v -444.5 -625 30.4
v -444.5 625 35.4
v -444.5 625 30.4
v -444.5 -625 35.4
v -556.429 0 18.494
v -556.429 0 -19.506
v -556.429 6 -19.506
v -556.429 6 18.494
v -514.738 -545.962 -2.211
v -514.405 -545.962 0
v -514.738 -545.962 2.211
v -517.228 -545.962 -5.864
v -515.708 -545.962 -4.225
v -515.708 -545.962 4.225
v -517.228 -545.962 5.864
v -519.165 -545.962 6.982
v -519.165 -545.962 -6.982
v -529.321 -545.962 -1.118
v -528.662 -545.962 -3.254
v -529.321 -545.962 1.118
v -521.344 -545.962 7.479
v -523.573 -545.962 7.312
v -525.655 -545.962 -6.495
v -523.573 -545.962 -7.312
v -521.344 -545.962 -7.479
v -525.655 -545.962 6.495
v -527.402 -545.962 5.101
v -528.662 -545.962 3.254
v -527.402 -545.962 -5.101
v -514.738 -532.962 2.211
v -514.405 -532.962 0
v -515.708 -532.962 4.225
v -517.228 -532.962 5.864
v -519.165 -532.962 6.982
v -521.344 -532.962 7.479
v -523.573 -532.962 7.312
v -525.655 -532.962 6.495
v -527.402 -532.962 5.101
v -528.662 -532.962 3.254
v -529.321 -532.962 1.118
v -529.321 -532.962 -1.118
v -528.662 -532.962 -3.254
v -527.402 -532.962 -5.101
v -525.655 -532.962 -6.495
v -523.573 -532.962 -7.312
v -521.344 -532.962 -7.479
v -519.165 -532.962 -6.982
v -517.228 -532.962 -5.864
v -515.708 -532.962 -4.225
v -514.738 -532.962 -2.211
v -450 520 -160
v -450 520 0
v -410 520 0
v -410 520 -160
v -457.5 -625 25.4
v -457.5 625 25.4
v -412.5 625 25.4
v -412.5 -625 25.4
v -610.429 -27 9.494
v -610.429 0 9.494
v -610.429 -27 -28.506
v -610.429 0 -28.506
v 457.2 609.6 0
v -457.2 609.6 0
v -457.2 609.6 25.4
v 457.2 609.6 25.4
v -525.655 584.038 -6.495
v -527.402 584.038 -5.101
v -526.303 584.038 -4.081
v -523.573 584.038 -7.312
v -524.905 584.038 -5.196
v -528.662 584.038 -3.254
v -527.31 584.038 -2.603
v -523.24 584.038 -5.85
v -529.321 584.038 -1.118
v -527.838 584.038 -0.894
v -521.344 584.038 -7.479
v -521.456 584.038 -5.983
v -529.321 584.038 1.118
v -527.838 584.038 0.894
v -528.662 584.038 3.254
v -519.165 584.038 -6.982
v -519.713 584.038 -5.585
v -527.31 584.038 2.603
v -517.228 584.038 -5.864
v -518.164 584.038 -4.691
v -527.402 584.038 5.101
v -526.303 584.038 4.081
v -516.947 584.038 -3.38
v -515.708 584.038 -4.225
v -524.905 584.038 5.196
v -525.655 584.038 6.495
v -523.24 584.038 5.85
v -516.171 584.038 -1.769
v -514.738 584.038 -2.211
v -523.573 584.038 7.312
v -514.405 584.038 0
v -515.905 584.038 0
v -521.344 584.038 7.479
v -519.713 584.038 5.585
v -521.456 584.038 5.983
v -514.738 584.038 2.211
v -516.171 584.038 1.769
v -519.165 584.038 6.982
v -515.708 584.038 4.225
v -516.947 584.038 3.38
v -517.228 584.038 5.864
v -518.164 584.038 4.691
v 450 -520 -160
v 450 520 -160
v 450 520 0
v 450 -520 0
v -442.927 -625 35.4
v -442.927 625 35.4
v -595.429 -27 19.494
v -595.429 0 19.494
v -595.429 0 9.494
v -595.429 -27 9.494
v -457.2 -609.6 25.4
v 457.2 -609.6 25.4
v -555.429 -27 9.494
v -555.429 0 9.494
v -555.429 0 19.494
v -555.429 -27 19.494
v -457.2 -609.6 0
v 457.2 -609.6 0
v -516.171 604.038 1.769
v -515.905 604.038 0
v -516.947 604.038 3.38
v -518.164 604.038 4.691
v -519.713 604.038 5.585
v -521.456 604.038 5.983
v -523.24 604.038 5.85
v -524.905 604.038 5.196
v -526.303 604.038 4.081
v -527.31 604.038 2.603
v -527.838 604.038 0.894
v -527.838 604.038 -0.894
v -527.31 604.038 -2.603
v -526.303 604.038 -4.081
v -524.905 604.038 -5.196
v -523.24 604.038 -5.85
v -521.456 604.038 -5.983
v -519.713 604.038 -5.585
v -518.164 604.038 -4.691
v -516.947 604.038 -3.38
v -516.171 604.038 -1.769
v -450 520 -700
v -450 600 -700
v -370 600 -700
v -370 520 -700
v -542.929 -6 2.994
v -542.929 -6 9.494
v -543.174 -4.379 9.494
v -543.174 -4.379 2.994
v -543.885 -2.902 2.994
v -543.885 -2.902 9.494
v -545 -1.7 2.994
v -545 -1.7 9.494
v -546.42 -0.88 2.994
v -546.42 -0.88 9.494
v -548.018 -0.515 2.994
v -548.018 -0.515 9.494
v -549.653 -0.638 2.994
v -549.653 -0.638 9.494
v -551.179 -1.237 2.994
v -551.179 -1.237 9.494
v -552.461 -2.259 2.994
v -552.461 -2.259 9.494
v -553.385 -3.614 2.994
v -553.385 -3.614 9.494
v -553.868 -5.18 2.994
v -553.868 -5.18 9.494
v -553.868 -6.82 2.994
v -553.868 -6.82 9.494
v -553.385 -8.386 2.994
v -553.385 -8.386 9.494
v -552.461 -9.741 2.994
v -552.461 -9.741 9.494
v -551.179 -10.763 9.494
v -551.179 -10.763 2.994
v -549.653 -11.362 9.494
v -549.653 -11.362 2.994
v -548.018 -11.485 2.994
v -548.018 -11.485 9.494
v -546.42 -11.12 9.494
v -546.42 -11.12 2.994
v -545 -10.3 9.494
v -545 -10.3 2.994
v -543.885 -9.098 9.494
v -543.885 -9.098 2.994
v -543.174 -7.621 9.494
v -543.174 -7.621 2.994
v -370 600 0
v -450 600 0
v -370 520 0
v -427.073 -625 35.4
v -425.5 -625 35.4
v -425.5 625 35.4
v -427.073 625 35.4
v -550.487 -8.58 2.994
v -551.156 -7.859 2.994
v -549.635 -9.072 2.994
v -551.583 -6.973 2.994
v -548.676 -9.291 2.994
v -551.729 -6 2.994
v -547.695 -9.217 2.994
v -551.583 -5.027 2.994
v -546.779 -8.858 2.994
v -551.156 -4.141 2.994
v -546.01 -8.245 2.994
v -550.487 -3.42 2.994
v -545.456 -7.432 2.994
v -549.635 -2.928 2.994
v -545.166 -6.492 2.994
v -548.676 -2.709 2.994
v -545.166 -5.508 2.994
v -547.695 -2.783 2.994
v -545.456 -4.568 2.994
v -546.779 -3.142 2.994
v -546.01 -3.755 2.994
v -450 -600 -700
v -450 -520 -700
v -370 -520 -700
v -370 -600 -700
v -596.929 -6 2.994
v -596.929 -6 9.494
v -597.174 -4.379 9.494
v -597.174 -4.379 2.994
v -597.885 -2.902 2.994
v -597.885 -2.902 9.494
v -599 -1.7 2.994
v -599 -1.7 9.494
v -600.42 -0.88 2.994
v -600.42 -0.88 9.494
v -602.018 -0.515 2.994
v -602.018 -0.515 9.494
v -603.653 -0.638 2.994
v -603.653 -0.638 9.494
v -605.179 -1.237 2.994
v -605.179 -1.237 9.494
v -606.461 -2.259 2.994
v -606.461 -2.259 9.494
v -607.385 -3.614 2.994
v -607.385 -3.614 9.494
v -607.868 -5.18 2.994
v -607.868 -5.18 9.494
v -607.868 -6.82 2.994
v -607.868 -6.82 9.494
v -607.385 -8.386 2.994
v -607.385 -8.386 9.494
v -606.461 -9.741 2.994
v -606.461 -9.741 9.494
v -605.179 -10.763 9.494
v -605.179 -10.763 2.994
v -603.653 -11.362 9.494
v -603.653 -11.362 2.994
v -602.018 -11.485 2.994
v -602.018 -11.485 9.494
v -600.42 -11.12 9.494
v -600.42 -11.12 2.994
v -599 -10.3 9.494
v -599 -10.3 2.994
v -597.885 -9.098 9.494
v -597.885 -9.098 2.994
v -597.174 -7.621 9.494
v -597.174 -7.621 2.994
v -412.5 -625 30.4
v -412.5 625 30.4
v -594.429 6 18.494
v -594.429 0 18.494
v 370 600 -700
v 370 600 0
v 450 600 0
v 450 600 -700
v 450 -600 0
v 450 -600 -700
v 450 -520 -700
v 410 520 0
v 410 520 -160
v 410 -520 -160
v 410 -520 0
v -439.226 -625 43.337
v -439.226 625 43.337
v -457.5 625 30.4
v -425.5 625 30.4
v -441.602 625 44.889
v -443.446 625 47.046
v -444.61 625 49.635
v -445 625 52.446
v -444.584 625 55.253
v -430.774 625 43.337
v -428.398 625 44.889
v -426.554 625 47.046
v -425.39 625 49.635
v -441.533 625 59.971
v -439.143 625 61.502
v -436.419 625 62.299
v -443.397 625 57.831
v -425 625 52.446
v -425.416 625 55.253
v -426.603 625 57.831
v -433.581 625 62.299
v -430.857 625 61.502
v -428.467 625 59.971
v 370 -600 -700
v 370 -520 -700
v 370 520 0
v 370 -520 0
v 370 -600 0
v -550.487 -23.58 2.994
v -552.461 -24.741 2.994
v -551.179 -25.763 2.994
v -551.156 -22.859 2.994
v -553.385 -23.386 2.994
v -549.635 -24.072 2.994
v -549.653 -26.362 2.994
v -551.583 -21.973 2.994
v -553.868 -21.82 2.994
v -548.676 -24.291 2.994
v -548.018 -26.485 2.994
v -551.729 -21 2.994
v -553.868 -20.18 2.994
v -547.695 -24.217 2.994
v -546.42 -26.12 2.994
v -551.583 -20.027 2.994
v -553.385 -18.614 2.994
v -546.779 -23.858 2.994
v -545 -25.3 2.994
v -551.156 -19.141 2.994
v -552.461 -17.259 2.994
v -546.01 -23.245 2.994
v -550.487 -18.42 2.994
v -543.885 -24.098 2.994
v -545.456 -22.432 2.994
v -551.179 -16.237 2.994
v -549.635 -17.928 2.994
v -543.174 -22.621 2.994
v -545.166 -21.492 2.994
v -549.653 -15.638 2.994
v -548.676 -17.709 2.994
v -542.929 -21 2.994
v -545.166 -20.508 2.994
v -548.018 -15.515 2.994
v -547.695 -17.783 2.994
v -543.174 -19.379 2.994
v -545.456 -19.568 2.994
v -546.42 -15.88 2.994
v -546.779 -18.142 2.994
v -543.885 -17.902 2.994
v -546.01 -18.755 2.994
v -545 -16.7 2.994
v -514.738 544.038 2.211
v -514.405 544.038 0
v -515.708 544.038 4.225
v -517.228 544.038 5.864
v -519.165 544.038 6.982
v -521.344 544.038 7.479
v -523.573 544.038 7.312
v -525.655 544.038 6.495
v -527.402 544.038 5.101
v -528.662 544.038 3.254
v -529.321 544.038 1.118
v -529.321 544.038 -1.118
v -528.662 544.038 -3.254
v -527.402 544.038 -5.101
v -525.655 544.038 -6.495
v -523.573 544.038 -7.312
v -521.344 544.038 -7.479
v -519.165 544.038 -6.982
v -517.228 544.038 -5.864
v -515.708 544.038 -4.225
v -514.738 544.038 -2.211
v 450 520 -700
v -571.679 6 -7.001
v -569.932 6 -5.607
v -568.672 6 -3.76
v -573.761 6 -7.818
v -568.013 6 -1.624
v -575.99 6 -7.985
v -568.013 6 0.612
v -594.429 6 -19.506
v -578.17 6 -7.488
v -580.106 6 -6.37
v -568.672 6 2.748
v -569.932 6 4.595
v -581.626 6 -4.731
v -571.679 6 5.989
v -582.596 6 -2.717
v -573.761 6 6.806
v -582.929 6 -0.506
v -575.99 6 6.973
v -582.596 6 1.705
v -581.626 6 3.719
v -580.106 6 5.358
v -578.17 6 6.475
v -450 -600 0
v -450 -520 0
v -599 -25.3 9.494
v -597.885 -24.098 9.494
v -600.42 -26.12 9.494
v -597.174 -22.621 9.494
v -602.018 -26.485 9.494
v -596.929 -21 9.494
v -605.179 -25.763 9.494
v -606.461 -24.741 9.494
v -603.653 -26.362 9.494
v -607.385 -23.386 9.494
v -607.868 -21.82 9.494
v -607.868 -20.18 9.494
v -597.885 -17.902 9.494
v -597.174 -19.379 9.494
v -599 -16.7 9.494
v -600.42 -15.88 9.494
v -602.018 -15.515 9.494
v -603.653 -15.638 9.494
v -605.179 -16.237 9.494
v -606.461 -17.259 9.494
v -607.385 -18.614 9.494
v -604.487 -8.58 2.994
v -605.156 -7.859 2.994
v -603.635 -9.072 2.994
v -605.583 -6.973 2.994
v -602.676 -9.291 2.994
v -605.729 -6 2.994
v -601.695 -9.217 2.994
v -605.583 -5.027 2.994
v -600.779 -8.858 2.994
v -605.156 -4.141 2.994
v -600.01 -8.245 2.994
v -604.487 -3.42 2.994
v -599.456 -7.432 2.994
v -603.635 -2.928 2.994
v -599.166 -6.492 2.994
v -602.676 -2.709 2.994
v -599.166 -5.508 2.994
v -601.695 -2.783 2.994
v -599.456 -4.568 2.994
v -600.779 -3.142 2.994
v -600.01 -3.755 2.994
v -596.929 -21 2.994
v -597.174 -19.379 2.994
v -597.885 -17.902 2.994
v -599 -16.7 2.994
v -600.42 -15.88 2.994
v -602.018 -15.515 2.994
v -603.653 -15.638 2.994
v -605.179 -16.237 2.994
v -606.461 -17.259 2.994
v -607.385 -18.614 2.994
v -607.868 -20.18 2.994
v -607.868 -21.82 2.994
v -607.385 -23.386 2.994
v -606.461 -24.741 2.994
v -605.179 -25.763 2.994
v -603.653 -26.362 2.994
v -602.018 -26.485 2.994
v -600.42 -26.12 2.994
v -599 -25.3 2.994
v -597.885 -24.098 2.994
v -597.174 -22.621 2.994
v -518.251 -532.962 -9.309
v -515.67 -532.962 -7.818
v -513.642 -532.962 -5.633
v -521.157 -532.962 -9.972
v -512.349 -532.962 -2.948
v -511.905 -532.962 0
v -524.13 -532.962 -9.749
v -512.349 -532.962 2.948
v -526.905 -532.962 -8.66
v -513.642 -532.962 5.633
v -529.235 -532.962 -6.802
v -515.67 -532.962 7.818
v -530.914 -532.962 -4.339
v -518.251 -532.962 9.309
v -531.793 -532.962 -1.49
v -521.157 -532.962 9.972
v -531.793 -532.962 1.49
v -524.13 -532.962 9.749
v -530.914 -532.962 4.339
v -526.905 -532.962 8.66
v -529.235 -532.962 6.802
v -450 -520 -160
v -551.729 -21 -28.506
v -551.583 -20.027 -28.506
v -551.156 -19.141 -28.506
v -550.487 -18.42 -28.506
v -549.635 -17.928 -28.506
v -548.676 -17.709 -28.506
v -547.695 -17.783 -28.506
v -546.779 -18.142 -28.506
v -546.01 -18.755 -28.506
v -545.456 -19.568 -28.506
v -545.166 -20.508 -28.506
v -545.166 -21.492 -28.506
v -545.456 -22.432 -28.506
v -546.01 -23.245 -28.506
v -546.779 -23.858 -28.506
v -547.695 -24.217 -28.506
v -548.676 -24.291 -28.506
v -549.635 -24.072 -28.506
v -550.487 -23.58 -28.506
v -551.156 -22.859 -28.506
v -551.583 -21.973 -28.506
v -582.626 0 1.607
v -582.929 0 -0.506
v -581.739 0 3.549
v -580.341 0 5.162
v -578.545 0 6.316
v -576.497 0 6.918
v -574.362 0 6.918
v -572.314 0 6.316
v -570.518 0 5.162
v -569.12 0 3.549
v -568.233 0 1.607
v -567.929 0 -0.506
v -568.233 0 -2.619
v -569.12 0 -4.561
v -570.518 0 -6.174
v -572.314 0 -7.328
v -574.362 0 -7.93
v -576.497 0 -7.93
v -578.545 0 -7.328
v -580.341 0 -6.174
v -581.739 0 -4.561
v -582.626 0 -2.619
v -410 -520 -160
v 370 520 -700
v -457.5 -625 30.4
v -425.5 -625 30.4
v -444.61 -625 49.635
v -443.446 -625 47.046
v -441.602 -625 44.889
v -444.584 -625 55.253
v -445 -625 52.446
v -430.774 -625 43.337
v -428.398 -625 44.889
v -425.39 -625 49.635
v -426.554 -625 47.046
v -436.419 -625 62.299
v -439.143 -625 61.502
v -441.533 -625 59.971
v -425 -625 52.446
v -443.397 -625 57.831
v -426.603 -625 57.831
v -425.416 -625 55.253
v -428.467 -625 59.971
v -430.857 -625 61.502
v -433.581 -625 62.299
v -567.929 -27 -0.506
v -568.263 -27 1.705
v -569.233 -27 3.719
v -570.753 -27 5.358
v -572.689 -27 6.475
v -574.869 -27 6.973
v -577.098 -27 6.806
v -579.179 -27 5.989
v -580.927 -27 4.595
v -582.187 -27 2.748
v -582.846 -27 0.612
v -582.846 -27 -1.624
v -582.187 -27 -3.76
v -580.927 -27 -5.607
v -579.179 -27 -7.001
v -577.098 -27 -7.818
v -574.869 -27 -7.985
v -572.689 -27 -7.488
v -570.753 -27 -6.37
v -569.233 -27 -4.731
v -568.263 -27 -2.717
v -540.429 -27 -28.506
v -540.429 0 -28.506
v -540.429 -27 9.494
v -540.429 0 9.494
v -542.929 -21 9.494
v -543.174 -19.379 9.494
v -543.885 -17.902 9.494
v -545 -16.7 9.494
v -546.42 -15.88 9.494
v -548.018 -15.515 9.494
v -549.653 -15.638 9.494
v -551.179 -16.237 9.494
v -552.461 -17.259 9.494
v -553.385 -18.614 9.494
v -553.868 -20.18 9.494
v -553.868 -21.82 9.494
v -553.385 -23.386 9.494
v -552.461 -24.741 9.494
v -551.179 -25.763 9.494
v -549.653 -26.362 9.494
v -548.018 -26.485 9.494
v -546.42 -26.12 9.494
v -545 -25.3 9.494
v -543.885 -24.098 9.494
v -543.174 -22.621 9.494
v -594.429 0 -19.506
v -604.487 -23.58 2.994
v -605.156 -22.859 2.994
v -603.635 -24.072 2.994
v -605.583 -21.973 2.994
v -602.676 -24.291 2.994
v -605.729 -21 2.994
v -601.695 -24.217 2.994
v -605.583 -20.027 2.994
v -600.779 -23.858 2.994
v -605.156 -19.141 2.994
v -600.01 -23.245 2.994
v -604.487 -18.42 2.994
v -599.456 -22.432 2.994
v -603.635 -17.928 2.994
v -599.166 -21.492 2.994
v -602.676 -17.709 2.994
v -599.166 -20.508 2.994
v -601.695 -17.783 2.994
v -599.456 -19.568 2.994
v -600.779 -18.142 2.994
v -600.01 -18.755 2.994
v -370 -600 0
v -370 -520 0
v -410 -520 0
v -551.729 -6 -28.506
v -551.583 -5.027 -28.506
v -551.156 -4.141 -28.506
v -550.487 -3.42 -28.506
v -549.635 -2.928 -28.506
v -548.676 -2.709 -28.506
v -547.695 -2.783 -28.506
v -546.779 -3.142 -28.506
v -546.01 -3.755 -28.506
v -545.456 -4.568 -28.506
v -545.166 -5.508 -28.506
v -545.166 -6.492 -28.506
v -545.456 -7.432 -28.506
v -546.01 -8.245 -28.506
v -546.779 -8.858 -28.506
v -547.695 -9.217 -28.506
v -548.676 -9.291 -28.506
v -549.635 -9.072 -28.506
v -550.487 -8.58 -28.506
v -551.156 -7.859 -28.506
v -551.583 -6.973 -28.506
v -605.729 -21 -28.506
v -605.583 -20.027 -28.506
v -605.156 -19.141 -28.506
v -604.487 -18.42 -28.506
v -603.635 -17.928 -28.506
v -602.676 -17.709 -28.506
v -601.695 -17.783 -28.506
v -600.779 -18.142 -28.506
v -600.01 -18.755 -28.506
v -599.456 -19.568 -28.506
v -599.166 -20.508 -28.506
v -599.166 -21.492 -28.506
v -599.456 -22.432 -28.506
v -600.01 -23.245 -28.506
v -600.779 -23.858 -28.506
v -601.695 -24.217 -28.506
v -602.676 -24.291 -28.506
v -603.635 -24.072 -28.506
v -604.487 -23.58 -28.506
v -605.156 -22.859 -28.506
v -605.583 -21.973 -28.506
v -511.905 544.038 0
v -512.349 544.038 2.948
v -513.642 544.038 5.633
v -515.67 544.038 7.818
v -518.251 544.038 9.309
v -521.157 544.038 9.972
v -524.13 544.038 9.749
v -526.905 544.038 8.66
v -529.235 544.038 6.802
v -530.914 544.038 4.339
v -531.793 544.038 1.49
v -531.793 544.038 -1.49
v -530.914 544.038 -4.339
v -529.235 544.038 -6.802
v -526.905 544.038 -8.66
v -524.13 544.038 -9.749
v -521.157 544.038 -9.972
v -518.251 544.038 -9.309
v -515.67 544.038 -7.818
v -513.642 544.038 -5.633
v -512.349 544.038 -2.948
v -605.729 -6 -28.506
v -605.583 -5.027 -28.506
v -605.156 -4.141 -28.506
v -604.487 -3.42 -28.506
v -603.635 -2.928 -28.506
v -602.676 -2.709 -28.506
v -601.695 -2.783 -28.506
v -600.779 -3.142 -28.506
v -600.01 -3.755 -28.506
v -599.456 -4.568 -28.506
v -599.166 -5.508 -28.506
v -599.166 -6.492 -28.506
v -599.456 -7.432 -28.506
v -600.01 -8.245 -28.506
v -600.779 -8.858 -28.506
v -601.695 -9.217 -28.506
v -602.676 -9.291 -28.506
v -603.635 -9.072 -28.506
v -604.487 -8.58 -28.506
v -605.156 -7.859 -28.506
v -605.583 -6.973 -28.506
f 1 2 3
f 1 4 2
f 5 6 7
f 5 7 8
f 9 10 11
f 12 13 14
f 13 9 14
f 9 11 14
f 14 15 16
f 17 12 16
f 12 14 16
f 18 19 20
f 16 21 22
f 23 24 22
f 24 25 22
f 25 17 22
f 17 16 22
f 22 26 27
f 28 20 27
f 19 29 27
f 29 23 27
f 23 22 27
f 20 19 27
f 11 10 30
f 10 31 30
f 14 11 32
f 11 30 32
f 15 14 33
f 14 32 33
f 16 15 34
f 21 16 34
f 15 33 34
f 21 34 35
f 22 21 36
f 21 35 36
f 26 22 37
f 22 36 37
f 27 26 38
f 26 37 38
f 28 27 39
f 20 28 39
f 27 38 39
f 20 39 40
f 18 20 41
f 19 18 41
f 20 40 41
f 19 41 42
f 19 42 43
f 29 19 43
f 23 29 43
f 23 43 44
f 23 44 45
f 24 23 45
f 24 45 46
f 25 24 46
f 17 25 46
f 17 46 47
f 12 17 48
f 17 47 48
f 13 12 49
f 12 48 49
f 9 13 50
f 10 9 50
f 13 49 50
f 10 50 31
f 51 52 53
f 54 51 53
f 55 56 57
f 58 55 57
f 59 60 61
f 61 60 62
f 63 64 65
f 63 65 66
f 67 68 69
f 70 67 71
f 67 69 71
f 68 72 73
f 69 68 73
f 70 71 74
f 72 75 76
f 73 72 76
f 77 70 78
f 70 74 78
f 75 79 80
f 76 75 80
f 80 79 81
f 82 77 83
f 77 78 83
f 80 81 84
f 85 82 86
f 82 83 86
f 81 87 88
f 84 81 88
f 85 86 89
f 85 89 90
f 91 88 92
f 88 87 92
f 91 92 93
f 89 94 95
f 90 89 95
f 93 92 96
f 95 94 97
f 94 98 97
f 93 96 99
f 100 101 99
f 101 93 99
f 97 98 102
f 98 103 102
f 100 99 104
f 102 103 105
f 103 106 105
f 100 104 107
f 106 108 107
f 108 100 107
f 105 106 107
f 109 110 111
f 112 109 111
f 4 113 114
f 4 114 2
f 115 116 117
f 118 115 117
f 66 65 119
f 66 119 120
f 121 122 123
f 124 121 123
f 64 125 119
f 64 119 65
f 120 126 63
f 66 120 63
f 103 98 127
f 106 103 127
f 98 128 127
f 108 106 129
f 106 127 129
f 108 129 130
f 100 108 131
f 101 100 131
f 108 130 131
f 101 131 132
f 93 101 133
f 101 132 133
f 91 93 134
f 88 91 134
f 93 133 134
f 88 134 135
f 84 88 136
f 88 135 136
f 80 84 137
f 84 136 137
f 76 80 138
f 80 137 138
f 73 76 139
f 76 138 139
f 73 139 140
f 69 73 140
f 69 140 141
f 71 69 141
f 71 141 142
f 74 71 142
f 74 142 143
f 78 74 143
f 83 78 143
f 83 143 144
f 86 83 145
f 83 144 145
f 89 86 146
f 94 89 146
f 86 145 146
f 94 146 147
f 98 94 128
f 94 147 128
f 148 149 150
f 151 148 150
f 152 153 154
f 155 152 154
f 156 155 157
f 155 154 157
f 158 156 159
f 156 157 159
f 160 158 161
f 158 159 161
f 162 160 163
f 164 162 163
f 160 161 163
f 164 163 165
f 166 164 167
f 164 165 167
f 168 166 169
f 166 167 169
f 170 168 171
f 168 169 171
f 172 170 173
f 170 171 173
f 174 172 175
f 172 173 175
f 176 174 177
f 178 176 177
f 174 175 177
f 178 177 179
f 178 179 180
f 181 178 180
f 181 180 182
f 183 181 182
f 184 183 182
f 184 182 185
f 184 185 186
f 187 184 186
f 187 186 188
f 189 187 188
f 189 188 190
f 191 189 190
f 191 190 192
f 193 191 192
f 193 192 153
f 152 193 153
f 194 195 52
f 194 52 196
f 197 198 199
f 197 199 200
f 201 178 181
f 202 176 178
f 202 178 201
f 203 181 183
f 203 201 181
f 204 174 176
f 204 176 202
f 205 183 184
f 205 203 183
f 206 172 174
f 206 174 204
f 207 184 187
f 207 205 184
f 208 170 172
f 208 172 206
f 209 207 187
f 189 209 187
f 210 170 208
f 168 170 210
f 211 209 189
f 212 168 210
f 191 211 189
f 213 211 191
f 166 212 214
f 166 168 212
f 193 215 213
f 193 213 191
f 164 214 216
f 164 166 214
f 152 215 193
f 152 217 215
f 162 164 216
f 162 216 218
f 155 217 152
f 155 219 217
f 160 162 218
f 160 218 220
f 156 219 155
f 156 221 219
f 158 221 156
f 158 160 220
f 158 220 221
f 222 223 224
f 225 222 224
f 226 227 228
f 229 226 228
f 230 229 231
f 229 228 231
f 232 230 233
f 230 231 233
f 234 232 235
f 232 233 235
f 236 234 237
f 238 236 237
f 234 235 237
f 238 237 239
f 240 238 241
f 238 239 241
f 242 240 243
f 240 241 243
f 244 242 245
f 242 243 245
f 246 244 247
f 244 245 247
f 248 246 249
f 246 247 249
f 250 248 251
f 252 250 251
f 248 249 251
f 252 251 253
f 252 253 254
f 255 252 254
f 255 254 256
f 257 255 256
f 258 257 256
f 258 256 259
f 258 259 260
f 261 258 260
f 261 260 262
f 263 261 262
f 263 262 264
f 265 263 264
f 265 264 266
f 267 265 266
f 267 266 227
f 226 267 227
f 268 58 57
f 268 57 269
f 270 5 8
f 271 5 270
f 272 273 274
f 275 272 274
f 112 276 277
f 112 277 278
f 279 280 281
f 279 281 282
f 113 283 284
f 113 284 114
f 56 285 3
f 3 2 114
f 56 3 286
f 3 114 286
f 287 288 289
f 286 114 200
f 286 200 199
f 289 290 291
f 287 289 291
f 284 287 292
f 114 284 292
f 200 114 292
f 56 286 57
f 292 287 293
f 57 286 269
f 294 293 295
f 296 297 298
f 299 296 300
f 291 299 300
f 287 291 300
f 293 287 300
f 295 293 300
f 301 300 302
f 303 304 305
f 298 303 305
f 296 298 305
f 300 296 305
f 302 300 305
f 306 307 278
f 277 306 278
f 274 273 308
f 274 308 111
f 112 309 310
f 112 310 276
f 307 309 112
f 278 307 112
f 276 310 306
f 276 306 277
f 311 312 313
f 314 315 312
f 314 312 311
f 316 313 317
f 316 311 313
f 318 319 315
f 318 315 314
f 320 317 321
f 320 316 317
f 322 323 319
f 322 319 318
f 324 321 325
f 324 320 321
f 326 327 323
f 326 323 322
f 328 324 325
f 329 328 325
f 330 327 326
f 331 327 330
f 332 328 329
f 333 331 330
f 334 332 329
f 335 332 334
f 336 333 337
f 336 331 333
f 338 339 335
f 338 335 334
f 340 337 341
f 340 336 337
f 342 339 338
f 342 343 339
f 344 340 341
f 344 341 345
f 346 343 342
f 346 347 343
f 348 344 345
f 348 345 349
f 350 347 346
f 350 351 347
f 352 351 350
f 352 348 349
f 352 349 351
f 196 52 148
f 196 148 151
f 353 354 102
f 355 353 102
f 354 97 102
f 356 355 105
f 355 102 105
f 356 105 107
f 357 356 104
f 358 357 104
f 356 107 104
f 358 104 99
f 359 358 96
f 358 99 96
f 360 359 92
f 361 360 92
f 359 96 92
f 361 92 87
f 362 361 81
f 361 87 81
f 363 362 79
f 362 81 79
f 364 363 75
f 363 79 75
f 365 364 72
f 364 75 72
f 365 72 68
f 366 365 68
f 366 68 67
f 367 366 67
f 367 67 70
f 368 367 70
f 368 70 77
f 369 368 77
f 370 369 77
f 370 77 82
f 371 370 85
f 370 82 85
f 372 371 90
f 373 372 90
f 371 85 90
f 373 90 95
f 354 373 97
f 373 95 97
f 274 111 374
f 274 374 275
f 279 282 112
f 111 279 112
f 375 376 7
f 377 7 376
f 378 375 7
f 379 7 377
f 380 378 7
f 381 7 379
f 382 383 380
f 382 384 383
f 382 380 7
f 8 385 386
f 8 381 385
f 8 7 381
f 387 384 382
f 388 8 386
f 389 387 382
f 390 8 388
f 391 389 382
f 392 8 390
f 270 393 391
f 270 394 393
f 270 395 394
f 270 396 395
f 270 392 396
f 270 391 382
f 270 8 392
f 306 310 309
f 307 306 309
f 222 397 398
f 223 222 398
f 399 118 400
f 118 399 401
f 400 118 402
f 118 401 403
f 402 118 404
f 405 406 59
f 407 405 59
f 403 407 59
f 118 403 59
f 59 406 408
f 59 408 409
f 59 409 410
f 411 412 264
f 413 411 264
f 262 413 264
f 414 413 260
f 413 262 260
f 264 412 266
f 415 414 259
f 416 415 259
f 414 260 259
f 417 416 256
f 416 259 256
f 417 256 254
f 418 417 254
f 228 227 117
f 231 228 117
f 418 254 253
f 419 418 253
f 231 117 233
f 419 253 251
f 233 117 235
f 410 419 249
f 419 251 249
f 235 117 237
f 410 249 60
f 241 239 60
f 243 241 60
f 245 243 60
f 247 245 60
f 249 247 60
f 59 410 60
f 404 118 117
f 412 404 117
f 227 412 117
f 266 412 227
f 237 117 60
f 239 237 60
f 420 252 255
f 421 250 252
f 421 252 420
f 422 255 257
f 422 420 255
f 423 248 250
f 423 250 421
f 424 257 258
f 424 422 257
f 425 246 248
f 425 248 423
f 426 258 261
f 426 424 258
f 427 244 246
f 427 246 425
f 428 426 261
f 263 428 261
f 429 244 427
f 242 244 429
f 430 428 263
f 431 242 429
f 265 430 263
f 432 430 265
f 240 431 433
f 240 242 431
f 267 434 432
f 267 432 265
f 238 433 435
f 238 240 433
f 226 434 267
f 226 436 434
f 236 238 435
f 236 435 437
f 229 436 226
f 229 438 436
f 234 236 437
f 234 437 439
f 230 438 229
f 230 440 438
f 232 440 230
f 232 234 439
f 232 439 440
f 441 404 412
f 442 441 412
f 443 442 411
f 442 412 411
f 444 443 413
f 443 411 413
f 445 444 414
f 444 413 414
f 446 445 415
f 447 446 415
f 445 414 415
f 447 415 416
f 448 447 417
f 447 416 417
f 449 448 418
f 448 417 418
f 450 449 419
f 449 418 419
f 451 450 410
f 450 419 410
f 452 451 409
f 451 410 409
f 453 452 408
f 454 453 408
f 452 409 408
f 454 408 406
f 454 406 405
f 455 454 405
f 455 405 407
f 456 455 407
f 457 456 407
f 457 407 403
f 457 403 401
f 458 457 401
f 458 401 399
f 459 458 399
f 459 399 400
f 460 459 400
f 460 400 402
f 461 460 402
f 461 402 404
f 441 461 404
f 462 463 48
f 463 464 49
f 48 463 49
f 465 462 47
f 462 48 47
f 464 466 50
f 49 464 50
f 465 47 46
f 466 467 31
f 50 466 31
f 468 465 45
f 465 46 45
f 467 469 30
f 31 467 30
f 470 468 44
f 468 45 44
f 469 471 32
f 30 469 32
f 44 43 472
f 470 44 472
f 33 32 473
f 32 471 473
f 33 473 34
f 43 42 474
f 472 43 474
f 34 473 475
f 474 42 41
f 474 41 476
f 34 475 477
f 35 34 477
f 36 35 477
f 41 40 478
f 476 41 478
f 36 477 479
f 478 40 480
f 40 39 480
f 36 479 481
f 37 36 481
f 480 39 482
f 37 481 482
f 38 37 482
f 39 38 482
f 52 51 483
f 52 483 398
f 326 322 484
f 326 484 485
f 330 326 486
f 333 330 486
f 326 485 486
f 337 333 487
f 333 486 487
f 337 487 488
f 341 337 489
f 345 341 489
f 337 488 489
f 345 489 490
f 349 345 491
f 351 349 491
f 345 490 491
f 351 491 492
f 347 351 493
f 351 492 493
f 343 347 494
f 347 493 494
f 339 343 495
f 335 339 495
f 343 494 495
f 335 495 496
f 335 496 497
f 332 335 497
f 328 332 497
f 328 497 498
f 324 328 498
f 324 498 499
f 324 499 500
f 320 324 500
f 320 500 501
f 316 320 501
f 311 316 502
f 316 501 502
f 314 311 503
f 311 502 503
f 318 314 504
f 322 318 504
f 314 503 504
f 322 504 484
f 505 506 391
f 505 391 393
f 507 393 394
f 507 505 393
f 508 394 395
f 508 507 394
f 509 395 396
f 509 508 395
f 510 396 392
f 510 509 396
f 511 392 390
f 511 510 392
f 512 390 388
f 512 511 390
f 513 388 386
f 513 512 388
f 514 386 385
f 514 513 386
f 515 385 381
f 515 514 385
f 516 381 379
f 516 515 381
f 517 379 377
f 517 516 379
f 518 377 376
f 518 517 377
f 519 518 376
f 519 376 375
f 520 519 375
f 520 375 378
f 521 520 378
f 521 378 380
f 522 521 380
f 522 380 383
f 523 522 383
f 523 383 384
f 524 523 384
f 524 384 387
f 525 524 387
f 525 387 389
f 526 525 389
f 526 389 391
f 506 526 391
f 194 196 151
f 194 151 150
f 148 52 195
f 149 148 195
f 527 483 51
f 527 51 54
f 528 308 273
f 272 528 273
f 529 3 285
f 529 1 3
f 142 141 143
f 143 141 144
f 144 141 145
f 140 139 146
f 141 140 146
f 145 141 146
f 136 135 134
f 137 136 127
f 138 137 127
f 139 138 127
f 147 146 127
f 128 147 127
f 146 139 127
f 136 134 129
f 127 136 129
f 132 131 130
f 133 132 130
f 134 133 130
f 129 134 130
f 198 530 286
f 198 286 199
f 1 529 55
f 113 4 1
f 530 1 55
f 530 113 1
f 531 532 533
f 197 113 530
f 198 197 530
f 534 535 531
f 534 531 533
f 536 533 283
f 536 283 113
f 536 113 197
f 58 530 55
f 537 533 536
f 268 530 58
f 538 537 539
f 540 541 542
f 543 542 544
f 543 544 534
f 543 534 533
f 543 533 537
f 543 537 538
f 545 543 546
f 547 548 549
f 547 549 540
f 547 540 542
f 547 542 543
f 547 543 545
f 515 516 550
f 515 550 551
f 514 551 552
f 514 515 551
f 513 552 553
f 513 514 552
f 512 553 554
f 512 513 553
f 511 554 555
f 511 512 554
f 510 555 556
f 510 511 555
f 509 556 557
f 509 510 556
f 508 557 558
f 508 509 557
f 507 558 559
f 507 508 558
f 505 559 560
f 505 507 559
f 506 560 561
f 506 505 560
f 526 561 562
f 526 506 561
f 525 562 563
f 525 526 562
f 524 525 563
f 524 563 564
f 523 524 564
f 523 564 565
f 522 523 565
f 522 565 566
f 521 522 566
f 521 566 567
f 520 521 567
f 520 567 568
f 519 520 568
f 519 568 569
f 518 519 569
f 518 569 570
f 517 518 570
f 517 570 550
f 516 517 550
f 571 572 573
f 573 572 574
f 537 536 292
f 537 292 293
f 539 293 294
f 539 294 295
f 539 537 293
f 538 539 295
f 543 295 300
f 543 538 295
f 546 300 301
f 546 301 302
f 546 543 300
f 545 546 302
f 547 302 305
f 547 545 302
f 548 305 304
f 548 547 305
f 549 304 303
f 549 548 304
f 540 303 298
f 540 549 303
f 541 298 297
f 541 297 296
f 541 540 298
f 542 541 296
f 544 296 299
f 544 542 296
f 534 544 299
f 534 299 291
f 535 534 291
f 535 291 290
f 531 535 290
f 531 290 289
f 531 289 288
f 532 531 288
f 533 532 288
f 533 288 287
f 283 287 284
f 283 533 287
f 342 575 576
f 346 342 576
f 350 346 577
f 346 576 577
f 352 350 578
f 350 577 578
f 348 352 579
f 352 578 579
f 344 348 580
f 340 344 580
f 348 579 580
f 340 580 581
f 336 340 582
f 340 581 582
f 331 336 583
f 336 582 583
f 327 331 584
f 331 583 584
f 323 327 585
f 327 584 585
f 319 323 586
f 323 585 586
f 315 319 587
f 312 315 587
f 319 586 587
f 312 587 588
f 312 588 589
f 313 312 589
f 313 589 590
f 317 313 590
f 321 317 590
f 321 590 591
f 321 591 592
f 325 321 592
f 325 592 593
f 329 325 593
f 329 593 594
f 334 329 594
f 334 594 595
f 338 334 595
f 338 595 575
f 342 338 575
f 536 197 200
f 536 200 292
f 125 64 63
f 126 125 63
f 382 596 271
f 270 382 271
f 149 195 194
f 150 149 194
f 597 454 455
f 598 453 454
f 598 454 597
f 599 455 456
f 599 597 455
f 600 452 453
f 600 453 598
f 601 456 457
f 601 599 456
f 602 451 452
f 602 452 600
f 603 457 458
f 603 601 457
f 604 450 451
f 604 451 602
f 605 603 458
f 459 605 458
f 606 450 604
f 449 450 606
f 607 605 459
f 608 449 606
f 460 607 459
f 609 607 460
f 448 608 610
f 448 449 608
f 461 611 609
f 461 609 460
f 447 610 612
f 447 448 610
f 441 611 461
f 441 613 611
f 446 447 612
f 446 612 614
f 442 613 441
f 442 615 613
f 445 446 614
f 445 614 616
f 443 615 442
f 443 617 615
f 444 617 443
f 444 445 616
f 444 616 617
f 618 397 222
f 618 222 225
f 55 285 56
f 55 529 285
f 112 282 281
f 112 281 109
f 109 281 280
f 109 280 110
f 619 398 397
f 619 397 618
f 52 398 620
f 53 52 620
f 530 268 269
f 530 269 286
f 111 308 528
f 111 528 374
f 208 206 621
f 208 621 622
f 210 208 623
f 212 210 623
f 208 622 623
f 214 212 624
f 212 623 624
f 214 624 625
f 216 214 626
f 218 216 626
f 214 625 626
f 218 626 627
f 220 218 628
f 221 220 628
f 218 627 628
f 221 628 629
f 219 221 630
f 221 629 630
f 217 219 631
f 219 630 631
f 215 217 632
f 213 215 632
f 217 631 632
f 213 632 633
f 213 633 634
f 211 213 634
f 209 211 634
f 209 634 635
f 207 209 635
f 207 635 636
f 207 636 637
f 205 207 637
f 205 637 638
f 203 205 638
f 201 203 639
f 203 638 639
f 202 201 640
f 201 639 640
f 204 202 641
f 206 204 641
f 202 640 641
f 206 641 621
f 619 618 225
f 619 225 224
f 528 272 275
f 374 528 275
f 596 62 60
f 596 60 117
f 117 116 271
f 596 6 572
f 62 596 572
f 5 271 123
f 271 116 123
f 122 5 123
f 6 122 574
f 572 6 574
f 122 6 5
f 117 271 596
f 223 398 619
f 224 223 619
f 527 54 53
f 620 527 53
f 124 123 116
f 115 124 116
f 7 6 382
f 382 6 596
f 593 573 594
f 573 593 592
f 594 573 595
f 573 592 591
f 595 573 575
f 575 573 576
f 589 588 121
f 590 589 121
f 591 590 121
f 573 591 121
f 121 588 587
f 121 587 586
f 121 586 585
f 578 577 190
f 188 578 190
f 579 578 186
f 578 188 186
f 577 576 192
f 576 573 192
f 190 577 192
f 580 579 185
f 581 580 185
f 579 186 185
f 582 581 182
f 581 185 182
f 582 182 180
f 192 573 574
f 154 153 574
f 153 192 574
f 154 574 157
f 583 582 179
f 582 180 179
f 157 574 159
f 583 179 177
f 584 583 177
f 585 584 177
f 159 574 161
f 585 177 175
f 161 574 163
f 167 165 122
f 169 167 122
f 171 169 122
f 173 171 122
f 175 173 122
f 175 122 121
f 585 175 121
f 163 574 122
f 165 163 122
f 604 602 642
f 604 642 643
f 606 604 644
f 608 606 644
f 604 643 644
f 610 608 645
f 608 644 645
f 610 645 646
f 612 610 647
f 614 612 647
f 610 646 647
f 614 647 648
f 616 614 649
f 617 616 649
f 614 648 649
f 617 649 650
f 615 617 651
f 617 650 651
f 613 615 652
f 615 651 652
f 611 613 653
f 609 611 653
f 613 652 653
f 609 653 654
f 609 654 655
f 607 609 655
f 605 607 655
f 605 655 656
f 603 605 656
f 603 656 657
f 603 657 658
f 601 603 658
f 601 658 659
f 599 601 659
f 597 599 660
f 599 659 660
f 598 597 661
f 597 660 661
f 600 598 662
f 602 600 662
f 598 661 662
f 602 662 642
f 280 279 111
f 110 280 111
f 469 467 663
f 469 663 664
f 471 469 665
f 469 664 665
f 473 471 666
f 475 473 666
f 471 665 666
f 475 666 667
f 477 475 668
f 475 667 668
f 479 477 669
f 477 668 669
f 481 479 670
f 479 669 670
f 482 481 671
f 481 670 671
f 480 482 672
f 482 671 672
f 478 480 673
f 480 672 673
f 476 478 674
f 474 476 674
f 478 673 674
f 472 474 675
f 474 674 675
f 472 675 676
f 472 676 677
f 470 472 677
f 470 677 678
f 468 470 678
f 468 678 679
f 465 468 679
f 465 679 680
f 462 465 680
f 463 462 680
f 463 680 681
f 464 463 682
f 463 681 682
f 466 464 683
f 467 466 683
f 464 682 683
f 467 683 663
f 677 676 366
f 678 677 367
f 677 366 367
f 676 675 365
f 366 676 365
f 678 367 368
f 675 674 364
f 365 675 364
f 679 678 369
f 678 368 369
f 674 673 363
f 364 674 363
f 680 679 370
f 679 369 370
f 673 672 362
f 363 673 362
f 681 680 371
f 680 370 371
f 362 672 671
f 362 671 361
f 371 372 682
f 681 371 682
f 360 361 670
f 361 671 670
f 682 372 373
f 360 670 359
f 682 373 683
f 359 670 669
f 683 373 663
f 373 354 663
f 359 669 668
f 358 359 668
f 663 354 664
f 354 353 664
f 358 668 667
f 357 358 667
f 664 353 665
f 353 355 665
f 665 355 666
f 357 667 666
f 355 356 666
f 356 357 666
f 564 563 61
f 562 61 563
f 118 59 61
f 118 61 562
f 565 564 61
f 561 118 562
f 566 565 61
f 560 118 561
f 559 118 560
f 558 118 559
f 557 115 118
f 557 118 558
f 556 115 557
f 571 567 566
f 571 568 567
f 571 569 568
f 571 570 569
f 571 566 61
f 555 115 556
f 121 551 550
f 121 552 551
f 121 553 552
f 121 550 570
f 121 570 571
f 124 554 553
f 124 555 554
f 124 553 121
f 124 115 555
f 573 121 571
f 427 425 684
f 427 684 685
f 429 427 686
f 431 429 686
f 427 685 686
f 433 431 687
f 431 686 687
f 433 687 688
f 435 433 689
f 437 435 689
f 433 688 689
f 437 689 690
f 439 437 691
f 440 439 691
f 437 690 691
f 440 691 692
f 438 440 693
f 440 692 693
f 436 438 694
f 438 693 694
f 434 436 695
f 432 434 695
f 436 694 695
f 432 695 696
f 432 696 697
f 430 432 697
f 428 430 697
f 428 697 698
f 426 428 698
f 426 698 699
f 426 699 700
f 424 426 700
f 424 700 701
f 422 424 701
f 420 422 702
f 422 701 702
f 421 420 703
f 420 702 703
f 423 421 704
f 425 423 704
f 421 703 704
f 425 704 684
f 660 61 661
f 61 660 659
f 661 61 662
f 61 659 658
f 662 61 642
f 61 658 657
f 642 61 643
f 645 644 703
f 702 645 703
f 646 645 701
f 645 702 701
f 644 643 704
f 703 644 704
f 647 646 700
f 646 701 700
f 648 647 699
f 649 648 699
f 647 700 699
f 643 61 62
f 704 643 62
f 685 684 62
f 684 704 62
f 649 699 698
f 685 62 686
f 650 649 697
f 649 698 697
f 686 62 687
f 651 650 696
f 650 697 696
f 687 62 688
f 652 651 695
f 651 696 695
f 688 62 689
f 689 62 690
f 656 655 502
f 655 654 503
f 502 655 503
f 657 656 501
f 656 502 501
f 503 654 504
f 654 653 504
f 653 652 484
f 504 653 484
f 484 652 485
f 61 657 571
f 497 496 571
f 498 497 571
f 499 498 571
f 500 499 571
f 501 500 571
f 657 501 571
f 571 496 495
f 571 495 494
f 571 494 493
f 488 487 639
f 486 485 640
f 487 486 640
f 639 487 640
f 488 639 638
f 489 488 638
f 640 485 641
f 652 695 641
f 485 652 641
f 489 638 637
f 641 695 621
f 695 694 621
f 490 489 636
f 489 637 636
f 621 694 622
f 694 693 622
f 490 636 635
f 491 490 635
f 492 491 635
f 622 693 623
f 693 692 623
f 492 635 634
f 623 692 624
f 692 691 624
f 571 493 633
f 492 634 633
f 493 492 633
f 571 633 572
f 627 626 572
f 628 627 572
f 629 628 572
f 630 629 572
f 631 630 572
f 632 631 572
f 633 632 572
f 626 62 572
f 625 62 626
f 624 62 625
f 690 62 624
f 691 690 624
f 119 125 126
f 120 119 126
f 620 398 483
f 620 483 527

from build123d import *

# Parameters (mm, degrees)
F0_W            = 80
F0_H            = 80
F1_DEPTH        = 700
F2_W            = 40
F2_H            = 160
F3_DEPTH        = 1040
F0_W_2          = 914.4
F0_H_2          = 1219.2
F4_DEPTH        = 25.4
F6_DEPTH        = 625
F9_R            = 7.5
F10_DEPTH       = 27
F12_D           = 6.6
F12_CBORE_D     = 11
F12_CBORE_DEPTH = 6.5
F13_W           = 38
F13_H           = 38
F13_R           = 7.5
F14_DEPTH       = 6


with BuildPart() as f1:
    # F0 (on Top) → F1 (new body)
    with BuildSketch(Plane.XY):
        with Locations((-410, 560)):
            Rectangle(F0_W, F0_H)
    extrude(amount=-F1_DEPTH)


with BuildPart() as f1b:
    # F0 (on Top) → F1, piece 2 (new body)
    with BuildSketch(Plane.XY):
        with Locations((410, 560)):
            Rectangle(F0_W, F0_H)
    extrude(amount=-F1_DEPTH)


with BuildPart() as f1c:
    # F0 (on Top) → F1, piece 3 (new body)
    with BuildSketch(Plane.XY):
        with Locations((410, -560)):
            Rectangle(F0_W, F0_H)
    extrude(amount=-F1_DEPTH)


with BuildPart() as f1d:
    # F0 (on Top) → F1, piece 4 (new body)
    with BuildSketch(Plane.XY):
        with Locations((-410, -560)):
            Rectangle(F0_W, F0_H)
    extrude(amount=-F1_DEPTH)


with BuildPart() as f3:
    # F2 (on face) → F3 (new body, through all)
    with BuildSketch(Plane.XZ.offset(-520)):
        with Locations((-430, -80)):
            Rectangle(F2_W, F2_H)
    extrude(amount=F3_DEPTH)


with BuildPart() as f3b:
    # F2 (on face) → F3, piece 2 (new body, through all)
    with BuildSketch(Plane.XZ.offset(-520)):
        with Locations((430, -80)):
            Rectangle(F2_W, F2_H)
    extrude(amount=F3_DEPTH)


with BuildPart() as f4:
    # F0 (on Top) → F4 (new body)
    with BuildSketch(Plane.XY):
        Rectangle(F0_W_2, F0_H_2)
        with Locations((-410, -560)):
            Rectangle(F0_W, F0_H, mode=Mode.SUBTRACT)
        with Locations((410, -560)):
            Rectangle(F0_W, F0_H, mode=Mode.SUBTRACT)
        with Locations((-410, 560)):
            Rectangle(F0_W, F0_H, mode=Mode.SUBTRACT)
        with Locations((410, 560)):
            Rectangle(F0_W, F0_H, mode=Mode.SUBTRACT)
        with Locations((-410, 560)):
            Rectangle(F0_W, F0_H)
        with Locations((410, 560)):
            Rectangle(F0_W, F0_H)
        with Locations((410, -560)):
            Rectangle(F0_W, F0_H)
        with Locations((-410, -560)):
            Rectangle(F0_W, F0_H)
    extrude(amount=F4_DEPTH)


with BuildPart() as f6:
    # F5 (on Front) → F6 (new body, symmetric)
    with BuildSketch(Plane.XZ):
        with BuildLine():
            Line((-457.5, 30.4), (-457.5, 25.4))
            Line((-457.5, 25.4), (-412.5, 25.4))
            Line((-412.5, 25.4), (-412.5, 30.4))
            Line((-412.5, 30.4), (-425.5, 30.4))
            Line((-425.5, 30.4), (-425.5, 35.4))
            Line((-425.5, 35.4), (-427.0727698114, 35.4))
            Line((-427.0727698114, 35.4), (-430.7738173826, 43.3369221296))
            ThreePointArc((-430.7738173826, 43.3369221296), (-435, 62.4), (-439.2261826174, 43.3369221296))
            Line((-439.2261826174, 43.3369221296), (-442.9272301886, 35.4))
            Line((-442.9272301886, 35.4), (-444.5, 35.4))
            Line((-444.5, 35.4), (-444.5, 30.4))
            Line((-444.5, 30.4), (-457.5, 30.4))
        make_face()
    extrude(amount=F6_DEPTH, both=True)


with BuildPart() as f8:
    # F7 (on Top) → F8 (revolve)
    with BuildSketch(Plane.XY):
        Polygon((-515.9045877457, 604.0378603052), (-521.9045877457, 604.0378603052), (-521.9045877457, -545.9621396948), (-514.4045877457, -545.9621396948), (-514.4045877457, -532.9621396948), (-511.9045877457, -532.9621396948), (-511.9045877457, 544.0378603052), (-514.4045877457, 544.0378603052), (-514.4045877457, 584.0378603052), (-515.9045877457, 584.0378603052), align=None)
    revolve(axis=Axis((-521.9045877457, 620.2453569924, 0), (0, -1, 0)))


with BuildPart() as f10:
    # F9 (on Front) → F10 (new body)
    with BuildSketch(Plane.XZ):
        Polygon((-540.429469347, -28.5061191786), (-540.429469347, 9.4938808214), (-555.429469347, 9.4938808214), (-555.429469347, 19.4938808214), (-595.429469347, 19.4938808214), (-595.429469347, 9.4938808214), (-610.429469347, 9.4938808214), (-610.429469347, -28.5061191786), align=None)
        with Locations((-575.429469347, -0.5061191786)):
            Circle(F9_R, mode=Mode.SUBTRACT)
    extrude(amount=F10_DEPTH)

    # F12 (through all)
    with Locations(Plane.XY.offset(9.4938808214)):
        with Locations((-602.429469347, -6), (-602.429469347, -21), (-548.429469347, -6), (-548.429469347, -21)):
            CounterBoreHole(F12_D / 2, F12_CBORE_D / 2, F12_CBORE_DEPTH)

    # F13 (on face) → F14 (join)
    with BuildSketch(Plane(origin=(0, 0, 0), x_dir=(-1, 0, 0), z_dir=(0, 1, 0))):
        with Locations((575.429469347, -0.5061191786)):
            Rectangle(F13_W, F13_H)
        with Locations((575.429469347, -0.5061191786)):
            Circle(F13_R, mode=Mode.SUBTRACT)
    extrude(amount=F14_DEPTH)


solid = Compound([f1.part, f1b.part, f1c.part, f1d.part, f3.part, f3b.part, f4.part, f6.part, f8.part, f10.part])
